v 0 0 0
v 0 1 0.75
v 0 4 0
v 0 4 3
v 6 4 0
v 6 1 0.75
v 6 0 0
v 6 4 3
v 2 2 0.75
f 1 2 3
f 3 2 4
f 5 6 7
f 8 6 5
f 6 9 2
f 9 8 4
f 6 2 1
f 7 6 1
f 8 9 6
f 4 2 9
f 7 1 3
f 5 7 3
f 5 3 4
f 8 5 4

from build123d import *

# Parameters (mm, degrees)
F1_DEPTH  = 6
F4_DEPTH  = 25
F7_DEPTH  = 25
F10_DEPTH = 25
F13_DEPTH = 25


with BuildPart() as f1:
    # F0 (on Right) → F1 (new body)
    with BuildSketch(Plane.YZ):
        Polygon((4, 3), (0, 0), (4, 0), align=None)
    extrude(amount=F1_DEPTH)

    # F3 (on offset) → F4 (cut)
    with BuildSketch(Plane.XY.offset(0.75)):
        Polygon((2, 2), (0, 1), (6, 1), align=None)
    extrude(amount=F4_DEPTH, mode=Mode.SUBTRACT)

    # F6 (on 3pt) → F7 (cut)
    with BuildSketch(Plane(origin=(0.1320293399, 0.5281173594, -0.7041564792), x_dir=(0.9889363529, -0.0890042718, 0.1186723623), z_dir=(0.1483404529, 0.5933618117, -0.7911490823))):
        Polygon((5.9336181172, -1.25), (1.888868434, -2.05), (5.9336181172, -5), (6.7079407163, -1.000438584), align=None)
    extrude(amount=-F7_DEPTH, mode=Mode.SUBTRACT)

    # F9 (on 3pt) → F10 (cut)
    with BuildSketch(Plane(origin=(0, 0, 0), x_dir=(0.9578262852, 0.1724087313, -0.2298783085), z_dir=(-0.2873478856, 0.5746957711, -0.7662610282))):
        Polygon((0, -1.25), (0, -5), (2.0880613018, -2.05), align=None)
    extrude(amount=-F10_DEPTH, mode=Mode.SUBTRACT)

    # F12 (on 3pt) → F13 (cut)
    with BuildSketch(Plane(origin=(0, 0.7448275862, -0.6620689655), x_dir=(-1, 0, 0), z_dir=(0, 0.7474093187, -0.6643638388))):
        Polygon((-2, 1.8892846667), (0, 4.8996833114), (-6, 4.8996833114), align=None)
    extrude(amount=-F13_DEPTH, mode=Mode.SUBTRACT)


solid = f1.part
